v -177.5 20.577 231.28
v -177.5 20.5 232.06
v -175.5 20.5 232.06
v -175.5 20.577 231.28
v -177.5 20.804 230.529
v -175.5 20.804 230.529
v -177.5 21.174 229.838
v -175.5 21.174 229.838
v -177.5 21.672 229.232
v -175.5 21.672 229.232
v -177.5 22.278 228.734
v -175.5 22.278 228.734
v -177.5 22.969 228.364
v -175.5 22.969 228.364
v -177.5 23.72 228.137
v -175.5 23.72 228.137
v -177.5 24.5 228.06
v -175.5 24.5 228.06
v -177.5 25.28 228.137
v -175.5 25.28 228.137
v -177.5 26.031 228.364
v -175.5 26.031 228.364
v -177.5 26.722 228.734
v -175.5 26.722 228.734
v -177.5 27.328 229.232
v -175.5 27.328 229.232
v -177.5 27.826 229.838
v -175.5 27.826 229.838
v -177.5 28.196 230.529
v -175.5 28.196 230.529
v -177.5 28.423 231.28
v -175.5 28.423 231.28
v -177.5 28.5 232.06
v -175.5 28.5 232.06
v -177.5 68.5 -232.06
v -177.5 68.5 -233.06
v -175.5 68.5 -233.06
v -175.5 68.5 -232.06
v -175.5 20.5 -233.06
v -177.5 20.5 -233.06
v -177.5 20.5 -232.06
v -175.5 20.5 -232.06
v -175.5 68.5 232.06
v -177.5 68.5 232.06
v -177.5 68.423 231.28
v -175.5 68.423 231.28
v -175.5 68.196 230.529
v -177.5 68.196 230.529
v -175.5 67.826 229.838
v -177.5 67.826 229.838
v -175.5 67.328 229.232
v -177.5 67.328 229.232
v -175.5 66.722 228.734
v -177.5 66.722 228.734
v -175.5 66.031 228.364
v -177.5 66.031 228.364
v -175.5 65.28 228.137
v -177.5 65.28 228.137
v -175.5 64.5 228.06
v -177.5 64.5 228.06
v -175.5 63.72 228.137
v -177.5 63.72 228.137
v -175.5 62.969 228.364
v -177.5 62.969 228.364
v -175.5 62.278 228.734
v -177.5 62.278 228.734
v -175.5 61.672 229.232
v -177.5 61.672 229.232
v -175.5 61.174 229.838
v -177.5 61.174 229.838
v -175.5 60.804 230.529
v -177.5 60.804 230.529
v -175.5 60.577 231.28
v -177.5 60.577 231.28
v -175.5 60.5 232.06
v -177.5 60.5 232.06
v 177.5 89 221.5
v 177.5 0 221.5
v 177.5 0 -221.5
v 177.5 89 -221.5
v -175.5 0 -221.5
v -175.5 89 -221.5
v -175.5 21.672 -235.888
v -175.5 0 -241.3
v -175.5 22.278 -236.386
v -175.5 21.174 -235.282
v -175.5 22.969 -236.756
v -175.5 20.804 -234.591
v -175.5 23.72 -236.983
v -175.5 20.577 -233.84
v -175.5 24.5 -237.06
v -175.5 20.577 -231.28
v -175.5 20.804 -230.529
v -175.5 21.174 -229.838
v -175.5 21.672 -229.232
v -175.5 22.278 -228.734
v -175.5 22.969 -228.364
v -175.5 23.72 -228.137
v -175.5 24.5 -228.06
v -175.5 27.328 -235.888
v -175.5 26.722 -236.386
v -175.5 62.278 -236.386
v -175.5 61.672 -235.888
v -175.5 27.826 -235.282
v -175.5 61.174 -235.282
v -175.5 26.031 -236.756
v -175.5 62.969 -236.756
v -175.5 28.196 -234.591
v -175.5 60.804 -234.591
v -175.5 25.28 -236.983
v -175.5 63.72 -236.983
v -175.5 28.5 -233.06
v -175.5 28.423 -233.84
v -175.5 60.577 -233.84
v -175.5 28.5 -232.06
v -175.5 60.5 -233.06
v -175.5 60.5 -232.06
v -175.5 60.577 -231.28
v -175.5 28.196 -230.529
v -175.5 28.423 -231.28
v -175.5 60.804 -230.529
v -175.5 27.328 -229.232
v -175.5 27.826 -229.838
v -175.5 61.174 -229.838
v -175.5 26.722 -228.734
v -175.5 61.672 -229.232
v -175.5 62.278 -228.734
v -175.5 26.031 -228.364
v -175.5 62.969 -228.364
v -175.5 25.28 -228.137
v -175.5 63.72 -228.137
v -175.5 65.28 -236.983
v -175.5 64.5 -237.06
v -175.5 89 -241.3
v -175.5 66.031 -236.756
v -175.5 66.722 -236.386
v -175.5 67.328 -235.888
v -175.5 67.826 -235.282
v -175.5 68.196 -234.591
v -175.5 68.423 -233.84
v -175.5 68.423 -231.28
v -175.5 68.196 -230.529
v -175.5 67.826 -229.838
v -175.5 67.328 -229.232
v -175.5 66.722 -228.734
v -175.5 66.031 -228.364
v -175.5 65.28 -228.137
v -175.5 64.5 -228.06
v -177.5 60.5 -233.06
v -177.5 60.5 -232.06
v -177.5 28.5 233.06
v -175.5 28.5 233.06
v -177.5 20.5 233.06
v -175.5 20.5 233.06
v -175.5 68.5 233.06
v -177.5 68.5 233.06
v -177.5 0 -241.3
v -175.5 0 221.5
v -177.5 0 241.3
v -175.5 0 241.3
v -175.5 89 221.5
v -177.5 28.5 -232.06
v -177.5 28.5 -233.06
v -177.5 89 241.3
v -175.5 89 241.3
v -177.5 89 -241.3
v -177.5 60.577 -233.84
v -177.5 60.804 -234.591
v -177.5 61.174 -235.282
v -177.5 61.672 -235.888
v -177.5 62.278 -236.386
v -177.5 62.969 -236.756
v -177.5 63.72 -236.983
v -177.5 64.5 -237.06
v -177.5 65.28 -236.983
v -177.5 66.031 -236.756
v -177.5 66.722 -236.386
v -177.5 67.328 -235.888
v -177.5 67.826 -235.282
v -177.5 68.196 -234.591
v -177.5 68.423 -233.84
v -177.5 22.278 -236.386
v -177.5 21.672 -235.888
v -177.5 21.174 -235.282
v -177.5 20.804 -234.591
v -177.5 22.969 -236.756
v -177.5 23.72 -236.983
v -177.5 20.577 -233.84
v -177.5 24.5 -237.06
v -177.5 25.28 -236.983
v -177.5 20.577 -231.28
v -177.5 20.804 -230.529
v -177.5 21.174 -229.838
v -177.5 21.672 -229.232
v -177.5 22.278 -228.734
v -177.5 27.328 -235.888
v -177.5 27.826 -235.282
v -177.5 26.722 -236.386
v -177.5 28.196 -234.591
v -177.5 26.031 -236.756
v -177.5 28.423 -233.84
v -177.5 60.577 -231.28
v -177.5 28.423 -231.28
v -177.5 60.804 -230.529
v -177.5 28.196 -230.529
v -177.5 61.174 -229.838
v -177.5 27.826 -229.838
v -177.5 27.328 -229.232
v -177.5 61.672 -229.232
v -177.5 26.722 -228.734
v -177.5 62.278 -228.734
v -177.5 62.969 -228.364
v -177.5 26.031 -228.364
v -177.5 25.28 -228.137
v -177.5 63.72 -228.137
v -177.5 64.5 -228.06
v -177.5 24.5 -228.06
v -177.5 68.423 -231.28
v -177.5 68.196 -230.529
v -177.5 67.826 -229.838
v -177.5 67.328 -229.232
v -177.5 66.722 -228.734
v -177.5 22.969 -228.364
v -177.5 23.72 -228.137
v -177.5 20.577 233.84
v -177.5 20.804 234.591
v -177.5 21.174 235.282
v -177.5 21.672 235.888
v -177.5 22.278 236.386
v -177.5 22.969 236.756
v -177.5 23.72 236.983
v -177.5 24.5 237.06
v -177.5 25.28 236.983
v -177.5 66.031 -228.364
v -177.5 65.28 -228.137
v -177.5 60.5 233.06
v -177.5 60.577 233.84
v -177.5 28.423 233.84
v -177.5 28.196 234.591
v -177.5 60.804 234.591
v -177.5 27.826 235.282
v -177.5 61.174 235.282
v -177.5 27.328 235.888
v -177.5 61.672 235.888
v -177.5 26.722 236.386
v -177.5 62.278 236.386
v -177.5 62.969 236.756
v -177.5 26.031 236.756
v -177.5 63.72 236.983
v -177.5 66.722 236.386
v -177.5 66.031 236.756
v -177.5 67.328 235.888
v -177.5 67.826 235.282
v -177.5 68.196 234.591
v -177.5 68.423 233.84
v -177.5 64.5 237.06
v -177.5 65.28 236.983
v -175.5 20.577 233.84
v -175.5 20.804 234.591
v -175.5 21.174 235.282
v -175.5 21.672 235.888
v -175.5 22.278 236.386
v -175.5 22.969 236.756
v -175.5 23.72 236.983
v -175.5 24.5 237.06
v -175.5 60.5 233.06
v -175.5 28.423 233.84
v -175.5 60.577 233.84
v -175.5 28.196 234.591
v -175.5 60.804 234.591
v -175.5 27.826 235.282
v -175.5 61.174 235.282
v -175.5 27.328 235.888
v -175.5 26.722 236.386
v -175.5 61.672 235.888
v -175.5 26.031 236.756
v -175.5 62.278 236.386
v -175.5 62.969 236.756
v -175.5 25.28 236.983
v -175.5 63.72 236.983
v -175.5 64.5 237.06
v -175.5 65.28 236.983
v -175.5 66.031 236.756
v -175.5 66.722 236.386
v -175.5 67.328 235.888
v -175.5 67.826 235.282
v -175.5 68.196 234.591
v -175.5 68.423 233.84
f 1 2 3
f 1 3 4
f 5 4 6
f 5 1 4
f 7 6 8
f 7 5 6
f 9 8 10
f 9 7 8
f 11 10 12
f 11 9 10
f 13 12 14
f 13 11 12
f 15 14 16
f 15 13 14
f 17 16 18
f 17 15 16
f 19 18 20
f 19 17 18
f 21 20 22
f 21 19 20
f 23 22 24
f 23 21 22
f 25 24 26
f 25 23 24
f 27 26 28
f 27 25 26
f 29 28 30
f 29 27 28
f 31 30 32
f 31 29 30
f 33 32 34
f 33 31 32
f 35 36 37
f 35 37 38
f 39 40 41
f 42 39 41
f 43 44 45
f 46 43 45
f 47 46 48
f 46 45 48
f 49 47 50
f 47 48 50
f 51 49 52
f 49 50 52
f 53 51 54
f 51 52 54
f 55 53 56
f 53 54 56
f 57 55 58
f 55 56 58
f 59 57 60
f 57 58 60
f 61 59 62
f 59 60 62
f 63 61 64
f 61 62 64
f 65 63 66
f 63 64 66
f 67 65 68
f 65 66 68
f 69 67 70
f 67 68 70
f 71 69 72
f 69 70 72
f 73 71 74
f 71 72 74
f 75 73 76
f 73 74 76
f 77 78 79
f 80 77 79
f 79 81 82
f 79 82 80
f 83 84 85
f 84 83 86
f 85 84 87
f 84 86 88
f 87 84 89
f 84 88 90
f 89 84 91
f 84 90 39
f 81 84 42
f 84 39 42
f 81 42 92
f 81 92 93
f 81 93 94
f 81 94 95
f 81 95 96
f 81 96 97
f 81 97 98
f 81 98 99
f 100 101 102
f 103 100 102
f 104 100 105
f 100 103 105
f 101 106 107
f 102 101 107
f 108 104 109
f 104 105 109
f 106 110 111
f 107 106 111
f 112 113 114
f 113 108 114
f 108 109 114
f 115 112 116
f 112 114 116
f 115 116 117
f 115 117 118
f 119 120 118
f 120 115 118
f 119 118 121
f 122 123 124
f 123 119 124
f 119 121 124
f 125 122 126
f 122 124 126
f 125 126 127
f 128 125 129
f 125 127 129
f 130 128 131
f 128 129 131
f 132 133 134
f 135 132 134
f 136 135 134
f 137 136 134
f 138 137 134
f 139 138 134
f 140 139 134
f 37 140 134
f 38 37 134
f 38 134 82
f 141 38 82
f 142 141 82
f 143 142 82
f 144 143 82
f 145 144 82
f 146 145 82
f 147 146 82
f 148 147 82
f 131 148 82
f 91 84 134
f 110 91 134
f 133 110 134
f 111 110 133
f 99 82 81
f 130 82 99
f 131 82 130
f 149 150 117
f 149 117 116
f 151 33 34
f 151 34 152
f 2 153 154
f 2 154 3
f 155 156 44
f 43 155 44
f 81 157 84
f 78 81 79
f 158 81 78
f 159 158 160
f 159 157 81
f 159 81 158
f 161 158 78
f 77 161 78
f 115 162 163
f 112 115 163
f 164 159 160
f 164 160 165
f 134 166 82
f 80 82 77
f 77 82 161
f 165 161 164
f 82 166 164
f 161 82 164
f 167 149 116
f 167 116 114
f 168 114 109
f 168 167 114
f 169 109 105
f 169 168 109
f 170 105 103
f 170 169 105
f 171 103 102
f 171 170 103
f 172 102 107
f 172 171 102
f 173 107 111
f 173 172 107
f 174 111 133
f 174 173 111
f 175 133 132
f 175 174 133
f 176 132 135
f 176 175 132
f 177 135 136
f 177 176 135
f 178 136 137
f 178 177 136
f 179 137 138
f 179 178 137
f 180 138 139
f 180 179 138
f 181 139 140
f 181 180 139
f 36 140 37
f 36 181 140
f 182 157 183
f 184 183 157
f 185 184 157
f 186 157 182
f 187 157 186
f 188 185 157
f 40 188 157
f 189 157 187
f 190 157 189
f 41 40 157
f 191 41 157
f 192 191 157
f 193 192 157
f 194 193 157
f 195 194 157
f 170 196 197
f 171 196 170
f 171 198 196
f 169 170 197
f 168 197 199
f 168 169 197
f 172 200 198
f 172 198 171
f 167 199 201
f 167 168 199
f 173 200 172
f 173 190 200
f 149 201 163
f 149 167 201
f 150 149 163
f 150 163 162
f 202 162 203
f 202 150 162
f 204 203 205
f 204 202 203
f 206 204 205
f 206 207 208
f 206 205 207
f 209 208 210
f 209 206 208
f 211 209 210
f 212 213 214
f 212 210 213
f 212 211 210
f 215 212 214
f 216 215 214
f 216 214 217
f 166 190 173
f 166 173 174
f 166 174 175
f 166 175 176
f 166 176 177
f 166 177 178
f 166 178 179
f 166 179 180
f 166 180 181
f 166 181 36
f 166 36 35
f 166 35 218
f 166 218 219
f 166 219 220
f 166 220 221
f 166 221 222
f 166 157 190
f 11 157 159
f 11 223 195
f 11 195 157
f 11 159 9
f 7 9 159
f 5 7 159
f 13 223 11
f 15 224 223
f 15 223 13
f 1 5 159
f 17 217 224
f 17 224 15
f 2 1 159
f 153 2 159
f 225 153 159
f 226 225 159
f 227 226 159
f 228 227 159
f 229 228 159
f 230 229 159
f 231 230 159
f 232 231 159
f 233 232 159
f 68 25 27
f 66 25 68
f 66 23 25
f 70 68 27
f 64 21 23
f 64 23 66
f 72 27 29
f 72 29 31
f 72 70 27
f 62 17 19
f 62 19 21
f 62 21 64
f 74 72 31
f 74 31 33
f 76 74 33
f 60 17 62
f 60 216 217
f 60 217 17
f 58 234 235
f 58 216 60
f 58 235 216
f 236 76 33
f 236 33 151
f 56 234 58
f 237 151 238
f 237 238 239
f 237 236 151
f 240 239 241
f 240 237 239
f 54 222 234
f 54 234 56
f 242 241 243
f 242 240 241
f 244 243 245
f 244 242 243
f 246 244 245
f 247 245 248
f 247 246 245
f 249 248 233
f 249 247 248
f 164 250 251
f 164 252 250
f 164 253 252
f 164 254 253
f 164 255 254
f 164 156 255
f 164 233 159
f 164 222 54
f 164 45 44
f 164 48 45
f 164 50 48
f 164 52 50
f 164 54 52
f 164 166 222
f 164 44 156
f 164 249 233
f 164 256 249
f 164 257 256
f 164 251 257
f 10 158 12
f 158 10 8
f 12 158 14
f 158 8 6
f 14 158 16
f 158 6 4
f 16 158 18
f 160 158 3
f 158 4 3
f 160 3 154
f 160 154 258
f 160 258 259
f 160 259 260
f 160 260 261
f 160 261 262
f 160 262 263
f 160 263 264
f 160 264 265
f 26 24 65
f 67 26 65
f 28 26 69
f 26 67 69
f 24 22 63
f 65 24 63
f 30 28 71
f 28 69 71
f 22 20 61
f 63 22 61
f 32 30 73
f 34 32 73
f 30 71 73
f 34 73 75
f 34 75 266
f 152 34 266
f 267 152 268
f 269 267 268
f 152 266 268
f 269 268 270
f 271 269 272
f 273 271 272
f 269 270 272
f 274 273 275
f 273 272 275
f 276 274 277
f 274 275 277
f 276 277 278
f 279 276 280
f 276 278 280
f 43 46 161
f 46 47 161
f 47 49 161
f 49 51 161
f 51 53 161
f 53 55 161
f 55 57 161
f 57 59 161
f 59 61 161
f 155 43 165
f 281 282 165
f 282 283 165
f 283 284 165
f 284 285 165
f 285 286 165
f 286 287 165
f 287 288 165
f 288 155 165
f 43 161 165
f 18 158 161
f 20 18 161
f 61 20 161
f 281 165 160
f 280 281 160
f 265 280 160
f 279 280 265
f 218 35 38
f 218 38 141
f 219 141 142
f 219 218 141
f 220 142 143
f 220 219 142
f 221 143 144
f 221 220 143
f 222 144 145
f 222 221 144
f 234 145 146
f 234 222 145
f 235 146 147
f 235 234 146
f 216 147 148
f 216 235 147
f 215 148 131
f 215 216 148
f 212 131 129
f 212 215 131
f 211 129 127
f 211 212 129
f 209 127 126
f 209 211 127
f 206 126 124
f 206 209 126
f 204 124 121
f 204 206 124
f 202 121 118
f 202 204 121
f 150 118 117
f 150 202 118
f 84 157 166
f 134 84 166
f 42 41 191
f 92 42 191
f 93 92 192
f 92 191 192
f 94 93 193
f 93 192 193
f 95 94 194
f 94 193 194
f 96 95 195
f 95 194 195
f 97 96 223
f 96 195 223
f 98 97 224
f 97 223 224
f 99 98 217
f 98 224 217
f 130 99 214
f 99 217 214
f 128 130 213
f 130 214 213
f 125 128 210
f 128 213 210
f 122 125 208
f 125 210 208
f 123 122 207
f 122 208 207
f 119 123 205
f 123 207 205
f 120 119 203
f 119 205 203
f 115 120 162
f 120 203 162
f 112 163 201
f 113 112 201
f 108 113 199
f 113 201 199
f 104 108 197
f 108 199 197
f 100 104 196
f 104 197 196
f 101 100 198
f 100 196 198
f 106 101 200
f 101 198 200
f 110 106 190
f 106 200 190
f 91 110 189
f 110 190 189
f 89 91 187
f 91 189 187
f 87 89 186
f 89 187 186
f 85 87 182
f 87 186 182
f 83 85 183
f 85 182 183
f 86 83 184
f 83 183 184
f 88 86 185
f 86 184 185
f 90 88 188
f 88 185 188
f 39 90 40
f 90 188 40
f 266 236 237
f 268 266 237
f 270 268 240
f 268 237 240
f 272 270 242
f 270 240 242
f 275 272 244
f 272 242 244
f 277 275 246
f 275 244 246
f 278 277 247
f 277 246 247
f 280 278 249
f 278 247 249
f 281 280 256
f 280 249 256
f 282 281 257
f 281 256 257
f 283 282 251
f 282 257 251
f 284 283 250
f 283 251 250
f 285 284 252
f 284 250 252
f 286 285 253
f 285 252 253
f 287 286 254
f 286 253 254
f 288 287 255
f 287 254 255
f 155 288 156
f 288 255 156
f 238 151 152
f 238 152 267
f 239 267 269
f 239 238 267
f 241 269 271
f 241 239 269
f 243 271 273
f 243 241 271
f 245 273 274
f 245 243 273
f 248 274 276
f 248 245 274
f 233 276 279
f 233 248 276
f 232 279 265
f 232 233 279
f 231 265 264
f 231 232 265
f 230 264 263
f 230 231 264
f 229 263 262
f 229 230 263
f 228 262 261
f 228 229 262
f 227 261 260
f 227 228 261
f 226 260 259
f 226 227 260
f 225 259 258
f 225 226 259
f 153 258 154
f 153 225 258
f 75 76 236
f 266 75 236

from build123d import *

# Parameters (mm, degrees)
CROQUIS1_W              = 355
CROQUIS1_H              = 443
SALIENTE_EXTRUIR1_DEPTH = 89
CROQUIS2_W              = 482.6
CROQUIS2_H              = 89
SALIENTE_EXTRUIR2_DEPTH = 2


with BuildPart() as part:
    # Croquis1 → Saliente-Extruir1 (new body)
    with BuildSketch(Plane(origin=(0, 0, 0), x_dir=(1, 0, 0), z_dir=(0, 1, 0))):
        Rectangle(CROQUIS1_W, CROQUIS1_H)
    extrude(amount=SALIENTE_EXTRUIR1_DEPTH)

    # Croquis2 → Saliente-Extruir2 (add)
    with BuildSketch(Plane.ZY.offset(177.5)):
        with Locations((0, 44.5)):
            Rectangle(CROQUIS2_W, CROQUIS2_H)
        with BuildLine():
            Line((-233.06, 68.5), (-232.06, 68.5))
            ThreePointArc((-232.06, 68.5), (-228.06, 64.5), (-232.06, 60.5))
            Line((-232.06, 60.5), (-233.06, 60.5))
            ThreePointArc((-233.06, 60.5), (-237.06, 64.5), (-233.06, 68.5))
        make_face(mode=Mode.SUBTRACT)
        with BuildLine():
            Line((-233.06, 20.5), (-232.06, 20.5))
            ThreePointArc((-232.06, 20.5), (-228.06, 24.5), (-232.06, 28.5))
            Line((-232.06, 28.5), (-233.06, 28.5))
            ThreePointArc((-233.06, 28.5), (-237.06, 24.5), (-233.06, 20.5))
        make_face(mode=Mode.SUBTRACT)
        with BuildLine():
            Line((233.06, 68.5), (232.06, 68.5))
            ThreePointArc((232.06, 68.5), (228.06, 64.5), (232.06, 60.5))
            Line((232.06, 60.5), (233.06, 60.5))
            ThreePointArc((233.06, 60.5), (237.06, 64.5), (233.06, 68.5))
        make_face(mode=Mode.SUBTRACT)
        with BuildLine():
            Line((233.06, 20.5), (232.06, 20.5))
            ThreePointArc((232.06, 20.5), (228.06, 24.5), (232.06, 28.5))
            Line((232.06, 28.5), (233.06, 28.5))
            ThreePointArc((233.06, 28.5), (237.06, 24.5), (233.06, 20.5))
        make_face(mode=Mode.SUBTRACT)
    extrude(amount=-SALIENTE_EXTRUIR2_DEPTH)


solid = part.part
